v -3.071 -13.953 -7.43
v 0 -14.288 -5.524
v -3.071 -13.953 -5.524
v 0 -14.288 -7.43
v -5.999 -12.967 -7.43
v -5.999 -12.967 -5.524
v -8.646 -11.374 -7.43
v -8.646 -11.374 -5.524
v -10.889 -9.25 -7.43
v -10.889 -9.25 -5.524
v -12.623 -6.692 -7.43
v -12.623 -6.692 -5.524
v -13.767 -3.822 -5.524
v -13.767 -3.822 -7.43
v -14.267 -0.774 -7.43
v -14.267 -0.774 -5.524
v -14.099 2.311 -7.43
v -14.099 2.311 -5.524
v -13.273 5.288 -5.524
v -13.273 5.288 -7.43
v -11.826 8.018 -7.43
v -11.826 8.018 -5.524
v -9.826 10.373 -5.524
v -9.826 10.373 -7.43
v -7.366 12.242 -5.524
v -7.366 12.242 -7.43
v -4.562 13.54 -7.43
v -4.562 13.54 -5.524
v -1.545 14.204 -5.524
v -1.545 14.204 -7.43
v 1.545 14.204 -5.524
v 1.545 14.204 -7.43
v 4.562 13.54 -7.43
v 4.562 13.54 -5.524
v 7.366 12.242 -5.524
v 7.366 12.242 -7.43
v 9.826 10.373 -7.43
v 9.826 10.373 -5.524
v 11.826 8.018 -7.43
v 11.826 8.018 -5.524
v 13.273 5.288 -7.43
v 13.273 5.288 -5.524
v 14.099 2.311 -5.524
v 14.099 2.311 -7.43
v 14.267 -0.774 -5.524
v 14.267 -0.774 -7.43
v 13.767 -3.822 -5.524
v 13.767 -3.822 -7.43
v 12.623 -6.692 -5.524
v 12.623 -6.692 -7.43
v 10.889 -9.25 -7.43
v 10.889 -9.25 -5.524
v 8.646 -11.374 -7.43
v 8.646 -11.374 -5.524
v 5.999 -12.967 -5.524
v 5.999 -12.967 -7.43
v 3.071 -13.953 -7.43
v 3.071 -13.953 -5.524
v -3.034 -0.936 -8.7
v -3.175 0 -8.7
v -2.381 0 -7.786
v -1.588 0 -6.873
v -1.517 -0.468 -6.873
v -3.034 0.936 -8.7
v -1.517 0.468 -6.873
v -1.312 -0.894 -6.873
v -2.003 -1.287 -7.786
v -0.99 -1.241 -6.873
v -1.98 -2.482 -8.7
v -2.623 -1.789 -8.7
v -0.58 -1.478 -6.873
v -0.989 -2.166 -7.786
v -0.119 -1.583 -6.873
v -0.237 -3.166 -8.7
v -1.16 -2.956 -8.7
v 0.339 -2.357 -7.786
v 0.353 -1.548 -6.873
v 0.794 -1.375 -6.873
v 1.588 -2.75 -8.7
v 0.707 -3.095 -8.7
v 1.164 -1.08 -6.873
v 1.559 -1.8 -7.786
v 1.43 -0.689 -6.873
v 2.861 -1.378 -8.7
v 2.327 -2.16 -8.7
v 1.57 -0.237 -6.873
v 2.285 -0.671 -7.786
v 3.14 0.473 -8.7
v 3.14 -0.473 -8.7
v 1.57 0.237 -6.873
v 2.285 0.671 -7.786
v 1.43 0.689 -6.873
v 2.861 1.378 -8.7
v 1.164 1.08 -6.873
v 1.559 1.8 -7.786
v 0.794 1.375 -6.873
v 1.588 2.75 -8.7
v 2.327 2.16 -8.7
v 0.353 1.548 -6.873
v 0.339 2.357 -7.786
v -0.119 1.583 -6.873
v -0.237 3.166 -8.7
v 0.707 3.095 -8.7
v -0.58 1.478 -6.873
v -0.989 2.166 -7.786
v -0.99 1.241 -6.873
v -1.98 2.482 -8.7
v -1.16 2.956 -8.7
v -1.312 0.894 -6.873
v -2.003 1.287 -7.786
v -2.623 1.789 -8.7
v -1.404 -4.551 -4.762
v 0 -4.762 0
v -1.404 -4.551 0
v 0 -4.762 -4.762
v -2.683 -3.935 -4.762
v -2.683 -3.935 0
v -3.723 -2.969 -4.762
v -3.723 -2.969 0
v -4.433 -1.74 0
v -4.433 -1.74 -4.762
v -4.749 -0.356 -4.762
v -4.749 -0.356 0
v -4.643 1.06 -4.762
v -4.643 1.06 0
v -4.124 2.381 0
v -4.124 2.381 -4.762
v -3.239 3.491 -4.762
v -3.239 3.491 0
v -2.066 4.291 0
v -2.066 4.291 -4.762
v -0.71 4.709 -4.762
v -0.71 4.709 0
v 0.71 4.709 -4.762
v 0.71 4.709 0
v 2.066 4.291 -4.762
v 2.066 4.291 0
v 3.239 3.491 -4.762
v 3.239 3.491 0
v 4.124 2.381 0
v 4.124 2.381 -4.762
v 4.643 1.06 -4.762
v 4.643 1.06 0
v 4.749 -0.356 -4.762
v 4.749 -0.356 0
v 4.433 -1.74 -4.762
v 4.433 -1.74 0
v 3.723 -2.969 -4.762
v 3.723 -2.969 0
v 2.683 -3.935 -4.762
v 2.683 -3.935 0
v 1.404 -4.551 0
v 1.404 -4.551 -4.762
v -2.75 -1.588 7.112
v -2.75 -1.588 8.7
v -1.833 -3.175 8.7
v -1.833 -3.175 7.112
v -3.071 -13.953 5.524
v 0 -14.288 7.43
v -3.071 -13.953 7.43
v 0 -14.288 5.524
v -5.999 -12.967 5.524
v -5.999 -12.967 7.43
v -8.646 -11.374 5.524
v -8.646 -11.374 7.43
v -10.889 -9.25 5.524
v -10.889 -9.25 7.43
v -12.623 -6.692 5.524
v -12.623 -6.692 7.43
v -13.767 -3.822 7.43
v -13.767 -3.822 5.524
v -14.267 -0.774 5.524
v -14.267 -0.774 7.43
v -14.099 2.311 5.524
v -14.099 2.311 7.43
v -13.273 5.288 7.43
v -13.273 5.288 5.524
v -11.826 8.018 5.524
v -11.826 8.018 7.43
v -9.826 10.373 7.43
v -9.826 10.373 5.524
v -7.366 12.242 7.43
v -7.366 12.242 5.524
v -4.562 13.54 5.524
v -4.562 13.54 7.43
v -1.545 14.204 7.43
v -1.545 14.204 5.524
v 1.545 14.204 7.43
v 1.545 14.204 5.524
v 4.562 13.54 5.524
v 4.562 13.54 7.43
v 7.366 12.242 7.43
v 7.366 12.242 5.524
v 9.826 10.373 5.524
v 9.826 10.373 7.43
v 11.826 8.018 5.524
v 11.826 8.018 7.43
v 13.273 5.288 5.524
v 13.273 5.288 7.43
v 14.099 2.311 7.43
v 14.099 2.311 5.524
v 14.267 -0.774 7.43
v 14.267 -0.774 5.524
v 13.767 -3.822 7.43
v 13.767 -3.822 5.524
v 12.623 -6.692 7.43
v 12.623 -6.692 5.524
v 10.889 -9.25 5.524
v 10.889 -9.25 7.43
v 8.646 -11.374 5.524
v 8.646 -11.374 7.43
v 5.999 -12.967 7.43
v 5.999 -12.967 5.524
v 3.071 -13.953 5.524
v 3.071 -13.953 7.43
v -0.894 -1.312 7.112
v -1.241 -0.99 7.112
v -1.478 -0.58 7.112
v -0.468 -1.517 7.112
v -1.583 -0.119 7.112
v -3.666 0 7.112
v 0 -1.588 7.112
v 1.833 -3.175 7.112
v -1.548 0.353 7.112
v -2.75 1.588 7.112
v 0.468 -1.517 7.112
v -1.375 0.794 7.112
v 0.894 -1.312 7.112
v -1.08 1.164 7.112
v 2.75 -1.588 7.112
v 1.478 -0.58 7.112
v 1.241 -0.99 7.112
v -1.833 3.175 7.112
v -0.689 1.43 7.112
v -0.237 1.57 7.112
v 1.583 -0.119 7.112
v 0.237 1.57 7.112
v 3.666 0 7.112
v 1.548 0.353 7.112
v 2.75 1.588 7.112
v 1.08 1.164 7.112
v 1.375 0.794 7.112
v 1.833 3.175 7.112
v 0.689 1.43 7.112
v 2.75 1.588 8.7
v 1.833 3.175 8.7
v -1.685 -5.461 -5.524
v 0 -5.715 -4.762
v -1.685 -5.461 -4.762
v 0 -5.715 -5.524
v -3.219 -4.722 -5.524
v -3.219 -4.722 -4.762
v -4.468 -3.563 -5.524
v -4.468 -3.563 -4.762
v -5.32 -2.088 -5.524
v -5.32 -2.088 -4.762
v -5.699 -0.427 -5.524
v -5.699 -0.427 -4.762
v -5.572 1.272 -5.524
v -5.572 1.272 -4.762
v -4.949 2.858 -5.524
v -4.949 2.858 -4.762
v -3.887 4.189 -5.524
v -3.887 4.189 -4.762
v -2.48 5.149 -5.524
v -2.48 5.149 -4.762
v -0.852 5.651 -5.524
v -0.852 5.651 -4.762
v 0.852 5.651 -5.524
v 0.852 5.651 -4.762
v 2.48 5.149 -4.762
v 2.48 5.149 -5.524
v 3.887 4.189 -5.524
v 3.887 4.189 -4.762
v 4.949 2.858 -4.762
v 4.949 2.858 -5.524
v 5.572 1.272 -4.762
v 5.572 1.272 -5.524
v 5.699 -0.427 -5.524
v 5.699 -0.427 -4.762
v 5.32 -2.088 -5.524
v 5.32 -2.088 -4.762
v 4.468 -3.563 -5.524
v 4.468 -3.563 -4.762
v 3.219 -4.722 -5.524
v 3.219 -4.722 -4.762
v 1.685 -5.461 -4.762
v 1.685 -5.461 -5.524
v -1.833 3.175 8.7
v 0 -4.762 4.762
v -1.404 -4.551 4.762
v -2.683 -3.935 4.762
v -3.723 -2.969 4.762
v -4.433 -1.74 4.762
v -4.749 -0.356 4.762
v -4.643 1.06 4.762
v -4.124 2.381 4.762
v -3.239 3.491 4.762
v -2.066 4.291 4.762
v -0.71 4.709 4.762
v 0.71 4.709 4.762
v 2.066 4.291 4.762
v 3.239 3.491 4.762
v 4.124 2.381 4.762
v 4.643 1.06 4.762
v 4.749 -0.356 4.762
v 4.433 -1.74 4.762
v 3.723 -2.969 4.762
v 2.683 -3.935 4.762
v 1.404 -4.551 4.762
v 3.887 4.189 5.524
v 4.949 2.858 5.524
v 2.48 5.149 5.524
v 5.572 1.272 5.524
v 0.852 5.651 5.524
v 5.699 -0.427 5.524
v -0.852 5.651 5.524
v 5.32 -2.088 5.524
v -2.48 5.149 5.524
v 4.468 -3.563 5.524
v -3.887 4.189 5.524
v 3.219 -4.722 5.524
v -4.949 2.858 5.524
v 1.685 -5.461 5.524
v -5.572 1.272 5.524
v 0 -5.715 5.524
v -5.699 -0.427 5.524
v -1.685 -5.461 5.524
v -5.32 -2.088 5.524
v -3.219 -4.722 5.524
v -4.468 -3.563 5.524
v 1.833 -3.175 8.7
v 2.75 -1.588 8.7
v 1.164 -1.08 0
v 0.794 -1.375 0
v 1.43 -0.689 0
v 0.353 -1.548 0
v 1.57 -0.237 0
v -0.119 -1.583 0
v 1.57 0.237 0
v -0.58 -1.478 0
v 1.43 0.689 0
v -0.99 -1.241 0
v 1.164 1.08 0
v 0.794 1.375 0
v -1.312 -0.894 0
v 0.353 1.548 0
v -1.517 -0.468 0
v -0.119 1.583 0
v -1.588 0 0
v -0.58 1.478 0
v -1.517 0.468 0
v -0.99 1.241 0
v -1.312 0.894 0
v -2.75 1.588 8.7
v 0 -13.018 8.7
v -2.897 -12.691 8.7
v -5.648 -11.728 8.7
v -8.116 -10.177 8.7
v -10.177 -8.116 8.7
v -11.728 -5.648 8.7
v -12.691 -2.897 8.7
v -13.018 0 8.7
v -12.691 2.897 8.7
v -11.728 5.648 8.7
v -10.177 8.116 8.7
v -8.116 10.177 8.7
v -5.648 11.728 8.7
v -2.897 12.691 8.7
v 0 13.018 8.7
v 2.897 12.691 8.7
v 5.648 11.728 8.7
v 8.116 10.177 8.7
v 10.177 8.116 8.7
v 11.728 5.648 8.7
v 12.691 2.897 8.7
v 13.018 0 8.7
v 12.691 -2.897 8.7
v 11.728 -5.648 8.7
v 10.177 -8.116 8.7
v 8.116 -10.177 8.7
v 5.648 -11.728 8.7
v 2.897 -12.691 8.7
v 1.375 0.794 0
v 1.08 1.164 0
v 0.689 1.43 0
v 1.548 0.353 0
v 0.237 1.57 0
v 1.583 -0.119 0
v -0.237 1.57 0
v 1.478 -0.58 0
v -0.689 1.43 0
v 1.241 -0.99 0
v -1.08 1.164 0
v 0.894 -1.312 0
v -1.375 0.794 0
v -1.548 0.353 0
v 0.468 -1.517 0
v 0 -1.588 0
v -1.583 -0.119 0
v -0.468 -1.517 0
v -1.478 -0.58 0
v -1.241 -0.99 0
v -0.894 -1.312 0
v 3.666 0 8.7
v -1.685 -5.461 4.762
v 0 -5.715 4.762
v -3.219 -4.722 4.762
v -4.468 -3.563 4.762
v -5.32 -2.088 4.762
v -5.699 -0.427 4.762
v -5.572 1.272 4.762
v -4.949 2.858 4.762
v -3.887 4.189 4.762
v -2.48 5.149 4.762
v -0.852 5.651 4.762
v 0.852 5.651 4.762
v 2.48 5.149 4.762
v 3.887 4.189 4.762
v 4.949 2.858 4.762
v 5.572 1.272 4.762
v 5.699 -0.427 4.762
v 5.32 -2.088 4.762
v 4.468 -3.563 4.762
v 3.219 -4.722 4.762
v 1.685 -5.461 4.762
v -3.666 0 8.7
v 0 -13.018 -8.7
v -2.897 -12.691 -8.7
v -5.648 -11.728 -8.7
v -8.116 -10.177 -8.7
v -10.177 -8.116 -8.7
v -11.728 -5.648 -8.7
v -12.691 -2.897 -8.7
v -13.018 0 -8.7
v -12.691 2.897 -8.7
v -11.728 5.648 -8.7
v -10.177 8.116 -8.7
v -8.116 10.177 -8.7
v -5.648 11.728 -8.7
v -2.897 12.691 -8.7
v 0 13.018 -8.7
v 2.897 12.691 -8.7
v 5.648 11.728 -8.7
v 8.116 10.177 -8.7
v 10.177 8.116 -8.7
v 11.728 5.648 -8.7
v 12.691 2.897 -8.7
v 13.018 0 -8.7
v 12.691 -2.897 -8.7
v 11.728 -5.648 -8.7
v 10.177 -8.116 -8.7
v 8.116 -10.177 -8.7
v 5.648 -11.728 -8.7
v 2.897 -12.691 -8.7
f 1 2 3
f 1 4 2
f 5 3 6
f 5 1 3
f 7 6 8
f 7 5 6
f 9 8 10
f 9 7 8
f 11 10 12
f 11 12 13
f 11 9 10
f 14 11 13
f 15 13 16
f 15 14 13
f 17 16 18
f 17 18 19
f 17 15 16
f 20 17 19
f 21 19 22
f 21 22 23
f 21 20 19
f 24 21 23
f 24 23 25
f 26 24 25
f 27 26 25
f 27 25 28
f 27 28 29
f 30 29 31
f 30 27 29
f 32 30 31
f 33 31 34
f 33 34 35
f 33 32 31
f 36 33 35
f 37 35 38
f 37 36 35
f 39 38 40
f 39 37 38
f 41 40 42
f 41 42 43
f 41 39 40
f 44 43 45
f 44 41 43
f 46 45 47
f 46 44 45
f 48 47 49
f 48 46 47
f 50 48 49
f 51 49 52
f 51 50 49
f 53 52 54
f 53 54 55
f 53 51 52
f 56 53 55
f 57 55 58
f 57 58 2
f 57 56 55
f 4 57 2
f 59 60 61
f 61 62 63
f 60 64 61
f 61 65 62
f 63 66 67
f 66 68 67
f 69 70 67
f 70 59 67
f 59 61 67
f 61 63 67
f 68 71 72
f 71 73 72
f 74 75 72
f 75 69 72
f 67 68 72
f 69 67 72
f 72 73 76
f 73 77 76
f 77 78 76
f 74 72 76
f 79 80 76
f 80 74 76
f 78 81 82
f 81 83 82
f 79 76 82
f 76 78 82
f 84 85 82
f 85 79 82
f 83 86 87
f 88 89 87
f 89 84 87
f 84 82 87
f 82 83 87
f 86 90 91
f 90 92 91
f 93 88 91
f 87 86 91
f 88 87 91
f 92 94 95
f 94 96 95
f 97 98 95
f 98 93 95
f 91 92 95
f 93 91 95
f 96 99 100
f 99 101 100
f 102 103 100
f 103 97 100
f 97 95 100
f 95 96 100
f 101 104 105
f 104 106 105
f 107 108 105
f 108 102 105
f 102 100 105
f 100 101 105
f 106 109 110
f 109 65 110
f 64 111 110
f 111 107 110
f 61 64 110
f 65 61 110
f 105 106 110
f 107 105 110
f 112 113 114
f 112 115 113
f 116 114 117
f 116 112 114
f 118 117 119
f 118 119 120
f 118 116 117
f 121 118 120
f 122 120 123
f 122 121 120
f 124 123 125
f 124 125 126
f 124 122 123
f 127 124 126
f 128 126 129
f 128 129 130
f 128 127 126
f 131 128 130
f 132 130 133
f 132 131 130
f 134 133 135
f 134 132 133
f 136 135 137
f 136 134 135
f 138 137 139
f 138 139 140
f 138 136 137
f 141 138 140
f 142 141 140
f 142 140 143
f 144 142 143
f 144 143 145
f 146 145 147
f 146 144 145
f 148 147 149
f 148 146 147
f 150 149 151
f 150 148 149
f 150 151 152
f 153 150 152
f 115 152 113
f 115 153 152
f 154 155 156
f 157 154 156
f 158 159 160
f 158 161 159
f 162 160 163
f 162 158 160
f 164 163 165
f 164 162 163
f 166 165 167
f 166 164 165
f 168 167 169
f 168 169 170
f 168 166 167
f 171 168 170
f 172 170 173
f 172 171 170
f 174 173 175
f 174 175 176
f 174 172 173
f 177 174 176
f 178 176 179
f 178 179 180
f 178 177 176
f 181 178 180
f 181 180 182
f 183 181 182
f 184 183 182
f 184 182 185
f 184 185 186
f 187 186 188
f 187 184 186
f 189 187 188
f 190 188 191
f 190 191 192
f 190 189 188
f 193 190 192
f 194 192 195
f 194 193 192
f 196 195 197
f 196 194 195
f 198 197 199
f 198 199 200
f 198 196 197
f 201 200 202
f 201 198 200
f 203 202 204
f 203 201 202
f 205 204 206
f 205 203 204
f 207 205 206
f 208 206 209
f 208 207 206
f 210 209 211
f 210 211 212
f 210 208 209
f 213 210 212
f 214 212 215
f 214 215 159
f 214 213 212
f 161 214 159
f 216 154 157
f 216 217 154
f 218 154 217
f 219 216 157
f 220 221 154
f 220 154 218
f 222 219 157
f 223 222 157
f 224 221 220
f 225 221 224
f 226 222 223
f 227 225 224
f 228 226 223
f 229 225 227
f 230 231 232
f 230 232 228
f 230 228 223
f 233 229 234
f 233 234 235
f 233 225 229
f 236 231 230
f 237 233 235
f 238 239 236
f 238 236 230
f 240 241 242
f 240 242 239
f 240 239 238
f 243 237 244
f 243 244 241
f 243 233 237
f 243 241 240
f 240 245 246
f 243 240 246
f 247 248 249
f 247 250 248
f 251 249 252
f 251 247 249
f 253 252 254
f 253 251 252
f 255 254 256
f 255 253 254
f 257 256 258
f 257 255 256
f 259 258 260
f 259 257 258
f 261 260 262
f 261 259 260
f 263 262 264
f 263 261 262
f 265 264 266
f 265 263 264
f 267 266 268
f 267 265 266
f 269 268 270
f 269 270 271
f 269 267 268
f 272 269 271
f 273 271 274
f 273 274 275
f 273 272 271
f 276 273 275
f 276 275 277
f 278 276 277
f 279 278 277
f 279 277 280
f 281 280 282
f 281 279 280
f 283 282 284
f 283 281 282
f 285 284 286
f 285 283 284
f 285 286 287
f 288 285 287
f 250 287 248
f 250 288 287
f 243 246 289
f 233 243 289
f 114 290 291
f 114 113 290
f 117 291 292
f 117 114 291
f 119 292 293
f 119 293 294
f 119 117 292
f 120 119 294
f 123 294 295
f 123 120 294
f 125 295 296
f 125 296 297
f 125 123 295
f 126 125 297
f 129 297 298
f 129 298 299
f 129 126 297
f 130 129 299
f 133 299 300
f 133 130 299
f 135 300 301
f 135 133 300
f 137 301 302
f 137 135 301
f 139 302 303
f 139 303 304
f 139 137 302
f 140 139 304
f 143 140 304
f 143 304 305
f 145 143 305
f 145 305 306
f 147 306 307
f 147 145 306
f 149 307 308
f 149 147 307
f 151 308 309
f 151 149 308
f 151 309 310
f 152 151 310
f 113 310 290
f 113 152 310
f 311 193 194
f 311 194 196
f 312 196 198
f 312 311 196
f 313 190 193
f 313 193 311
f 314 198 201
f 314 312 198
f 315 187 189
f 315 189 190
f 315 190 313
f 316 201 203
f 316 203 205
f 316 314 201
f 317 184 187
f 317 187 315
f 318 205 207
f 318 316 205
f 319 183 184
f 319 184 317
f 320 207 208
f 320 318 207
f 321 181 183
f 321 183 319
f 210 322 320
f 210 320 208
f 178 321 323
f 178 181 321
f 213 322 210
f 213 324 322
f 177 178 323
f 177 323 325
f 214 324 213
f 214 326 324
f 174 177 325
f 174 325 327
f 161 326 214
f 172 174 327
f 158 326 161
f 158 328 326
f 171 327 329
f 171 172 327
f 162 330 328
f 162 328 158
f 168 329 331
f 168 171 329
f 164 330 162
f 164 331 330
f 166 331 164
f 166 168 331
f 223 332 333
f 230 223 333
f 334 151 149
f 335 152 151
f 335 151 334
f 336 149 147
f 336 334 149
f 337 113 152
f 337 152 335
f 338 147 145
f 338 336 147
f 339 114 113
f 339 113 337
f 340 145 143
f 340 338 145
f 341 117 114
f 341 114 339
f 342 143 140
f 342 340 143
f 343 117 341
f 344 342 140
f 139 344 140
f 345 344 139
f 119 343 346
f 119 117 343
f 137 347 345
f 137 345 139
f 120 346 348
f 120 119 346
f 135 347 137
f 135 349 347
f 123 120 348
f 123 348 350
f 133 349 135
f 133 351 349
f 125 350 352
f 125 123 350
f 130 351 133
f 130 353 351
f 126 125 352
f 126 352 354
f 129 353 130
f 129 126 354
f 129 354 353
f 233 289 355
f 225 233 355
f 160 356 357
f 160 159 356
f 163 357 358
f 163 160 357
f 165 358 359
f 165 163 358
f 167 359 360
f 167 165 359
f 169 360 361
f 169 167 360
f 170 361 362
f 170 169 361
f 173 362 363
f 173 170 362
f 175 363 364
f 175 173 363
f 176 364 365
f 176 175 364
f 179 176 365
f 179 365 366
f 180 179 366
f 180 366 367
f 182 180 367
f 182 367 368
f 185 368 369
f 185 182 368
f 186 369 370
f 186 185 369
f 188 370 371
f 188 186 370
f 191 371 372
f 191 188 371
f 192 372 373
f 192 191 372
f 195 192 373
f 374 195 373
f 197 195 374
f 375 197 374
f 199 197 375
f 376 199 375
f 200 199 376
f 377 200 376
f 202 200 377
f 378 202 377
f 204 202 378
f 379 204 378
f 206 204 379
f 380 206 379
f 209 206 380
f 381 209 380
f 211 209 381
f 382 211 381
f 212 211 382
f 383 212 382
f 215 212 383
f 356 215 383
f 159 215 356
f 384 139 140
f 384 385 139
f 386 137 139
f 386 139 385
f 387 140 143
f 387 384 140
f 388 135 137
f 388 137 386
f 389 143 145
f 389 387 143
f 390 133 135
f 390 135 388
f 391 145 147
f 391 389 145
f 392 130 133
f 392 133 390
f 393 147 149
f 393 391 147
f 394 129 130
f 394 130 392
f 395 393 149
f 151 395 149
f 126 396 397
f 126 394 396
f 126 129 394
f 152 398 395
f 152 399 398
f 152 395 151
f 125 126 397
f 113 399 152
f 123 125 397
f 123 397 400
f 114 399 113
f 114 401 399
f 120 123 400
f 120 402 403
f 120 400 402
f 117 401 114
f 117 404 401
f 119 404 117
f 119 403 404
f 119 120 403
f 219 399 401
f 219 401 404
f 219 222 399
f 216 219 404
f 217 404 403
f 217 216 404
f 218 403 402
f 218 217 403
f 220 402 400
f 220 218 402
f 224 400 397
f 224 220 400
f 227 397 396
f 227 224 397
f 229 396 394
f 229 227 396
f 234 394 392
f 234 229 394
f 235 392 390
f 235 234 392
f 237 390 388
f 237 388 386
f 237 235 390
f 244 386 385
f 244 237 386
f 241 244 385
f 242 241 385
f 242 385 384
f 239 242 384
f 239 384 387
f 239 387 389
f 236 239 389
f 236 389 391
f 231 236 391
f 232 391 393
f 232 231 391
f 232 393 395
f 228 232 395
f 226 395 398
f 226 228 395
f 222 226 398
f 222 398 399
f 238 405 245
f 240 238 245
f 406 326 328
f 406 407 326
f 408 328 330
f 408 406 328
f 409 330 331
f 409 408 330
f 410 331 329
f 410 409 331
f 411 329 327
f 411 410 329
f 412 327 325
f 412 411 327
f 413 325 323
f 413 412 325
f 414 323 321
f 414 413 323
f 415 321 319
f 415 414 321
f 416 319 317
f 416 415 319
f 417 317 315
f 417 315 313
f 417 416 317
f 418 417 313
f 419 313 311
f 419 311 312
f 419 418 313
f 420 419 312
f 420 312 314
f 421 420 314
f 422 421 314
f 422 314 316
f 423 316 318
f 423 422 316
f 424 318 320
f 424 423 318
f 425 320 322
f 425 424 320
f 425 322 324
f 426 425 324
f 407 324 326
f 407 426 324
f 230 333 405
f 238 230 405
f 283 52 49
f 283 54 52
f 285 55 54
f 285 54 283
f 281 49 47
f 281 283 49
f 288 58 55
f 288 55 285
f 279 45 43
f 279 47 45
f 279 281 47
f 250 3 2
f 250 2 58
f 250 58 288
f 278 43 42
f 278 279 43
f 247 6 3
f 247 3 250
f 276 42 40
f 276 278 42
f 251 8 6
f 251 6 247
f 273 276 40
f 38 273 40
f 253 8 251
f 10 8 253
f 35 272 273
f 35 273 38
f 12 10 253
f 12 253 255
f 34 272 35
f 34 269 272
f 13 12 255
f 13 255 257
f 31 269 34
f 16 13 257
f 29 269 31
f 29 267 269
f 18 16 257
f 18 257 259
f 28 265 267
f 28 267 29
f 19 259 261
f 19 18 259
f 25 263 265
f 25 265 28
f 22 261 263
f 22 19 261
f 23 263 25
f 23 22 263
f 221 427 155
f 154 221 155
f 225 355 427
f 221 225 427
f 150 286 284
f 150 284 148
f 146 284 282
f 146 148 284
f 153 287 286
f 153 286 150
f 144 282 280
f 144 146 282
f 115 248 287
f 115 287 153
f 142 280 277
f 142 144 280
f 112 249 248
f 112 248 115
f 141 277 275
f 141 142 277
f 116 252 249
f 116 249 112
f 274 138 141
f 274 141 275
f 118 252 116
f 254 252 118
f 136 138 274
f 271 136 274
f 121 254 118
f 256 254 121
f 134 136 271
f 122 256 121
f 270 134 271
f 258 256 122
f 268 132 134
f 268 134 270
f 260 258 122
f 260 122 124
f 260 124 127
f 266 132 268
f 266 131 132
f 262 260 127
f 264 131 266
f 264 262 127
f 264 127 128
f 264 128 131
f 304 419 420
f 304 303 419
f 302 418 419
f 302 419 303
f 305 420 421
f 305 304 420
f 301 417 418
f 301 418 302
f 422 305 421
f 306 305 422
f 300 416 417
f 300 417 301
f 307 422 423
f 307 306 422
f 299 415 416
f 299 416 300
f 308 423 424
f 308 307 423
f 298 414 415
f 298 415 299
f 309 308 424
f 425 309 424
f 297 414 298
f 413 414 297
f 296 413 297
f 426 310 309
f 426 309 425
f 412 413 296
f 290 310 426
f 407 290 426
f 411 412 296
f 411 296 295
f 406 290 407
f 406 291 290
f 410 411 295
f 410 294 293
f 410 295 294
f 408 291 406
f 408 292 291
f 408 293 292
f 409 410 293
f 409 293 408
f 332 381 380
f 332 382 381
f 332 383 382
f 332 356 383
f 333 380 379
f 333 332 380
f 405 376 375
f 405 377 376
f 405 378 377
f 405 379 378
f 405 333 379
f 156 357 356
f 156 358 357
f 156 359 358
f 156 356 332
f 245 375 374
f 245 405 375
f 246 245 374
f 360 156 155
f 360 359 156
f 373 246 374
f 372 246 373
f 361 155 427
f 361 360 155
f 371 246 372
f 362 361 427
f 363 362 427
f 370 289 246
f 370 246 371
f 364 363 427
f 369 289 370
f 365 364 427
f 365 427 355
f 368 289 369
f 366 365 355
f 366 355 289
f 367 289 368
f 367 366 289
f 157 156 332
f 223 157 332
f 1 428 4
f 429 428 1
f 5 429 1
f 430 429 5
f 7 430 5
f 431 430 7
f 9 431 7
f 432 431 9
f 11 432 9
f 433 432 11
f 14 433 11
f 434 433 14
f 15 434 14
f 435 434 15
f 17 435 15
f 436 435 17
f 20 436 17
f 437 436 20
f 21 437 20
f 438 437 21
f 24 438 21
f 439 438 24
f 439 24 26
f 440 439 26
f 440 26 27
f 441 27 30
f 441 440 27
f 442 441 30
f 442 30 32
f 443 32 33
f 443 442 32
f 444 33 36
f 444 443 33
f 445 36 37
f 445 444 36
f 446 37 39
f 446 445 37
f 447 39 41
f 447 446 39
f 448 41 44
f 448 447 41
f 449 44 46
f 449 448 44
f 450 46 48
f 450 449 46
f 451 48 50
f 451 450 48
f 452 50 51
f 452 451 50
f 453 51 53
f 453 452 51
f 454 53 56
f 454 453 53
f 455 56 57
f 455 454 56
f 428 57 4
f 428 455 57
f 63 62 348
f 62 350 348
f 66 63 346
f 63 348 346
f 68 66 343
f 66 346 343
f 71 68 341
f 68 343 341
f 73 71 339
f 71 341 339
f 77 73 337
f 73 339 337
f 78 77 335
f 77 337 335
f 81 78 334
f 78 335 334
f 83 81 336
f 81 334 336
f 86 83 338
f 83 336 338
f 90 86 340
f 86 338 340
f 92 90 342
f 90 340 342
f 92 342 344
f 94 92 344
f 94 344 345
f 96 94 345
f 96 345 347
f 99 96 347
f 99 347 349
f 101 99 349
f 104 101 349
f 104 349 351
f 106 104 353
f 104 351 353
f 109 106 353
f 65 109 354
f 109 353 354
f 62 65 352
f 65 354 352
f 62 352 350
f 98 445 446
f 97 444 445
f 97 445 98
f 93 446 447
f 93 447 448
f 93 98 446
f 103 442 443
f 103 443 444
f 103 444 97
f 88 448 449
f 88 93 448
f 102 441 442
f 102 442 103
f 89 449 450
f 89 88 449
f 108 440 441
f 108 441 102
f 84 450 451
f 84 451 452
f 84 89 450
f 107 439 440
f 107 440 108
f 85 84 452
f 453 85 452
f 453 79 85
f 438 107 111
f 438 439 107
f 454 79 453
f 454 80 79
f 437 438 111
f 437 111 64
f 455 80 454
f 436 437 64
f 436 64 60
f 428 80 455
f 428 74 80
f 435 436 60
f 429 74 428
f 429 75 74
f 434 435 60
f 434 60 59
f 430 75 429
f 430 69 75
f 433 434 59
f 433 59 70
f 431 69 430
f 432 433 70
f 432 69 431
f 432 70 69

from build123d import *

# Parameters (mm, degrees)
F3_DEPTH       = 1.5875
F7_D           = 3.175
F7_DEPTH       = 15.875
F7_CSINK_D     = 6.35
F7_CSINK_ANGLE = 82


with BuildPart() as f1:
    # F0 (on Right) → F1 (revolve)
    with BuildSketch(Plane.YZ):
        Polygon((-3.175, 8.6995), (-13.0175, 8.6995), (-14.2875, 7.4295), (-14.2875, 5.5245), (-5.715, 5.5245), (-5.715, 4.7625), (-4.7625, 4.7625), (-4.7625, 0), (-1.5875, 0), (-1.5875, 7.112), (-3.175, 7.112), align=None)
    revolve(axis=Axis((0, 0, 4.34975), (0, 0, -1)))

    # F2 (on face) → F3 (cut, through all)
    with BuildSketch(Plane.XY.offset(8.6995)):
        with BuildLine():
            Line((1.833087, 3.175), (0, 3.175))
            ThreePointArc((0, 3.175), (1.5875, 2.749631), (2.749631, 1.5875))
            Line((2.749631, 1.5875), (1.833087, 3.175))
        make_face()
        with BuildLine():
            ThreePointArc((3.175, 0), (3.066814, -0.82175), (2.749631, -1.5875))
            Line((2.749631, -1.5875), (3.666174, 0))
            Line((3.666174, 0), (2.749631, 1.5875))
            ThreePointArc((2.749631, 1.5875), (3.066815, 0.82175), (3.175, 0))
        make_face()
        with BuildLine():
            ThreePointArc((2.749631, -1.5875), (1.5875, -2.749631), (0, -3.175))
            Line((0, -3.175), (1.833087, -3.175))
            Line((1.833087, -3.175), (2.749631, -1.5875))
        make_face()
        with BuildLine():
            Line((-2.749631, -1.5875), (-1.833087, -3.175))
            Line((-1.833087, -3.175), (0, -3.175))
            ThreePointArc((0, -3.175), (-1.5875, -2.749631), (-2.749631, -1.5875))
        make_face()
        with BuildLine():
            Line((-3.666174, 0), (-2.749631, -1.5875))
            ThreePointArc((-2.749631, -1.5875), (-3.175, 0), (-2.749631, 1.5875))
            Line((-2.749631, 1.5875), (-3.666174, 0))
        make_face()
        with BuildLine():
            Line((-1.833087, 3.175), (-2.749631, 1.5875))
            ThreePointArc((-2.749631, 1.5875), (-1.5875, 2.749631), (0, 3.175))
            Line((0, 3.175), (-1.833087, 3.175))
        make_face()
    extrude(amount=-F3_DEPTH, mode=Mode.SUBTRACT)


with BuildPart() as f5:
    # F4 (on Right) → F5 (revolve)
    with BuildSketch(Plane.YZ):
        Polygon((0, 0), (-4.7625, 0), (-4.7625, -4.7625), (-5.715, -4.7625), (-5.715, -5.5245), (-14.2875, -5.5245), (-14.2875, -7.4295), (-13.0175, -8.6995), (0, -8.6995), align=None)
    revolve(axis=Axis((0, 0, 4.7625), (0, 0, -1)))

    # F7
    with Locations(Plane(origin=(0, 0, -8.6995), x_dir=(1, 0, 0), z_dir=(0, 0, -1))):
        with Locations((0, 0)):
            CounterSinkHole(F7_D / 2, F7_CSINK_D / 2, depth=F7_DEPTH, counter_sink_angle=F7_CSINK_ANGLE)


solid = Compound([f1.part, f5.part])
